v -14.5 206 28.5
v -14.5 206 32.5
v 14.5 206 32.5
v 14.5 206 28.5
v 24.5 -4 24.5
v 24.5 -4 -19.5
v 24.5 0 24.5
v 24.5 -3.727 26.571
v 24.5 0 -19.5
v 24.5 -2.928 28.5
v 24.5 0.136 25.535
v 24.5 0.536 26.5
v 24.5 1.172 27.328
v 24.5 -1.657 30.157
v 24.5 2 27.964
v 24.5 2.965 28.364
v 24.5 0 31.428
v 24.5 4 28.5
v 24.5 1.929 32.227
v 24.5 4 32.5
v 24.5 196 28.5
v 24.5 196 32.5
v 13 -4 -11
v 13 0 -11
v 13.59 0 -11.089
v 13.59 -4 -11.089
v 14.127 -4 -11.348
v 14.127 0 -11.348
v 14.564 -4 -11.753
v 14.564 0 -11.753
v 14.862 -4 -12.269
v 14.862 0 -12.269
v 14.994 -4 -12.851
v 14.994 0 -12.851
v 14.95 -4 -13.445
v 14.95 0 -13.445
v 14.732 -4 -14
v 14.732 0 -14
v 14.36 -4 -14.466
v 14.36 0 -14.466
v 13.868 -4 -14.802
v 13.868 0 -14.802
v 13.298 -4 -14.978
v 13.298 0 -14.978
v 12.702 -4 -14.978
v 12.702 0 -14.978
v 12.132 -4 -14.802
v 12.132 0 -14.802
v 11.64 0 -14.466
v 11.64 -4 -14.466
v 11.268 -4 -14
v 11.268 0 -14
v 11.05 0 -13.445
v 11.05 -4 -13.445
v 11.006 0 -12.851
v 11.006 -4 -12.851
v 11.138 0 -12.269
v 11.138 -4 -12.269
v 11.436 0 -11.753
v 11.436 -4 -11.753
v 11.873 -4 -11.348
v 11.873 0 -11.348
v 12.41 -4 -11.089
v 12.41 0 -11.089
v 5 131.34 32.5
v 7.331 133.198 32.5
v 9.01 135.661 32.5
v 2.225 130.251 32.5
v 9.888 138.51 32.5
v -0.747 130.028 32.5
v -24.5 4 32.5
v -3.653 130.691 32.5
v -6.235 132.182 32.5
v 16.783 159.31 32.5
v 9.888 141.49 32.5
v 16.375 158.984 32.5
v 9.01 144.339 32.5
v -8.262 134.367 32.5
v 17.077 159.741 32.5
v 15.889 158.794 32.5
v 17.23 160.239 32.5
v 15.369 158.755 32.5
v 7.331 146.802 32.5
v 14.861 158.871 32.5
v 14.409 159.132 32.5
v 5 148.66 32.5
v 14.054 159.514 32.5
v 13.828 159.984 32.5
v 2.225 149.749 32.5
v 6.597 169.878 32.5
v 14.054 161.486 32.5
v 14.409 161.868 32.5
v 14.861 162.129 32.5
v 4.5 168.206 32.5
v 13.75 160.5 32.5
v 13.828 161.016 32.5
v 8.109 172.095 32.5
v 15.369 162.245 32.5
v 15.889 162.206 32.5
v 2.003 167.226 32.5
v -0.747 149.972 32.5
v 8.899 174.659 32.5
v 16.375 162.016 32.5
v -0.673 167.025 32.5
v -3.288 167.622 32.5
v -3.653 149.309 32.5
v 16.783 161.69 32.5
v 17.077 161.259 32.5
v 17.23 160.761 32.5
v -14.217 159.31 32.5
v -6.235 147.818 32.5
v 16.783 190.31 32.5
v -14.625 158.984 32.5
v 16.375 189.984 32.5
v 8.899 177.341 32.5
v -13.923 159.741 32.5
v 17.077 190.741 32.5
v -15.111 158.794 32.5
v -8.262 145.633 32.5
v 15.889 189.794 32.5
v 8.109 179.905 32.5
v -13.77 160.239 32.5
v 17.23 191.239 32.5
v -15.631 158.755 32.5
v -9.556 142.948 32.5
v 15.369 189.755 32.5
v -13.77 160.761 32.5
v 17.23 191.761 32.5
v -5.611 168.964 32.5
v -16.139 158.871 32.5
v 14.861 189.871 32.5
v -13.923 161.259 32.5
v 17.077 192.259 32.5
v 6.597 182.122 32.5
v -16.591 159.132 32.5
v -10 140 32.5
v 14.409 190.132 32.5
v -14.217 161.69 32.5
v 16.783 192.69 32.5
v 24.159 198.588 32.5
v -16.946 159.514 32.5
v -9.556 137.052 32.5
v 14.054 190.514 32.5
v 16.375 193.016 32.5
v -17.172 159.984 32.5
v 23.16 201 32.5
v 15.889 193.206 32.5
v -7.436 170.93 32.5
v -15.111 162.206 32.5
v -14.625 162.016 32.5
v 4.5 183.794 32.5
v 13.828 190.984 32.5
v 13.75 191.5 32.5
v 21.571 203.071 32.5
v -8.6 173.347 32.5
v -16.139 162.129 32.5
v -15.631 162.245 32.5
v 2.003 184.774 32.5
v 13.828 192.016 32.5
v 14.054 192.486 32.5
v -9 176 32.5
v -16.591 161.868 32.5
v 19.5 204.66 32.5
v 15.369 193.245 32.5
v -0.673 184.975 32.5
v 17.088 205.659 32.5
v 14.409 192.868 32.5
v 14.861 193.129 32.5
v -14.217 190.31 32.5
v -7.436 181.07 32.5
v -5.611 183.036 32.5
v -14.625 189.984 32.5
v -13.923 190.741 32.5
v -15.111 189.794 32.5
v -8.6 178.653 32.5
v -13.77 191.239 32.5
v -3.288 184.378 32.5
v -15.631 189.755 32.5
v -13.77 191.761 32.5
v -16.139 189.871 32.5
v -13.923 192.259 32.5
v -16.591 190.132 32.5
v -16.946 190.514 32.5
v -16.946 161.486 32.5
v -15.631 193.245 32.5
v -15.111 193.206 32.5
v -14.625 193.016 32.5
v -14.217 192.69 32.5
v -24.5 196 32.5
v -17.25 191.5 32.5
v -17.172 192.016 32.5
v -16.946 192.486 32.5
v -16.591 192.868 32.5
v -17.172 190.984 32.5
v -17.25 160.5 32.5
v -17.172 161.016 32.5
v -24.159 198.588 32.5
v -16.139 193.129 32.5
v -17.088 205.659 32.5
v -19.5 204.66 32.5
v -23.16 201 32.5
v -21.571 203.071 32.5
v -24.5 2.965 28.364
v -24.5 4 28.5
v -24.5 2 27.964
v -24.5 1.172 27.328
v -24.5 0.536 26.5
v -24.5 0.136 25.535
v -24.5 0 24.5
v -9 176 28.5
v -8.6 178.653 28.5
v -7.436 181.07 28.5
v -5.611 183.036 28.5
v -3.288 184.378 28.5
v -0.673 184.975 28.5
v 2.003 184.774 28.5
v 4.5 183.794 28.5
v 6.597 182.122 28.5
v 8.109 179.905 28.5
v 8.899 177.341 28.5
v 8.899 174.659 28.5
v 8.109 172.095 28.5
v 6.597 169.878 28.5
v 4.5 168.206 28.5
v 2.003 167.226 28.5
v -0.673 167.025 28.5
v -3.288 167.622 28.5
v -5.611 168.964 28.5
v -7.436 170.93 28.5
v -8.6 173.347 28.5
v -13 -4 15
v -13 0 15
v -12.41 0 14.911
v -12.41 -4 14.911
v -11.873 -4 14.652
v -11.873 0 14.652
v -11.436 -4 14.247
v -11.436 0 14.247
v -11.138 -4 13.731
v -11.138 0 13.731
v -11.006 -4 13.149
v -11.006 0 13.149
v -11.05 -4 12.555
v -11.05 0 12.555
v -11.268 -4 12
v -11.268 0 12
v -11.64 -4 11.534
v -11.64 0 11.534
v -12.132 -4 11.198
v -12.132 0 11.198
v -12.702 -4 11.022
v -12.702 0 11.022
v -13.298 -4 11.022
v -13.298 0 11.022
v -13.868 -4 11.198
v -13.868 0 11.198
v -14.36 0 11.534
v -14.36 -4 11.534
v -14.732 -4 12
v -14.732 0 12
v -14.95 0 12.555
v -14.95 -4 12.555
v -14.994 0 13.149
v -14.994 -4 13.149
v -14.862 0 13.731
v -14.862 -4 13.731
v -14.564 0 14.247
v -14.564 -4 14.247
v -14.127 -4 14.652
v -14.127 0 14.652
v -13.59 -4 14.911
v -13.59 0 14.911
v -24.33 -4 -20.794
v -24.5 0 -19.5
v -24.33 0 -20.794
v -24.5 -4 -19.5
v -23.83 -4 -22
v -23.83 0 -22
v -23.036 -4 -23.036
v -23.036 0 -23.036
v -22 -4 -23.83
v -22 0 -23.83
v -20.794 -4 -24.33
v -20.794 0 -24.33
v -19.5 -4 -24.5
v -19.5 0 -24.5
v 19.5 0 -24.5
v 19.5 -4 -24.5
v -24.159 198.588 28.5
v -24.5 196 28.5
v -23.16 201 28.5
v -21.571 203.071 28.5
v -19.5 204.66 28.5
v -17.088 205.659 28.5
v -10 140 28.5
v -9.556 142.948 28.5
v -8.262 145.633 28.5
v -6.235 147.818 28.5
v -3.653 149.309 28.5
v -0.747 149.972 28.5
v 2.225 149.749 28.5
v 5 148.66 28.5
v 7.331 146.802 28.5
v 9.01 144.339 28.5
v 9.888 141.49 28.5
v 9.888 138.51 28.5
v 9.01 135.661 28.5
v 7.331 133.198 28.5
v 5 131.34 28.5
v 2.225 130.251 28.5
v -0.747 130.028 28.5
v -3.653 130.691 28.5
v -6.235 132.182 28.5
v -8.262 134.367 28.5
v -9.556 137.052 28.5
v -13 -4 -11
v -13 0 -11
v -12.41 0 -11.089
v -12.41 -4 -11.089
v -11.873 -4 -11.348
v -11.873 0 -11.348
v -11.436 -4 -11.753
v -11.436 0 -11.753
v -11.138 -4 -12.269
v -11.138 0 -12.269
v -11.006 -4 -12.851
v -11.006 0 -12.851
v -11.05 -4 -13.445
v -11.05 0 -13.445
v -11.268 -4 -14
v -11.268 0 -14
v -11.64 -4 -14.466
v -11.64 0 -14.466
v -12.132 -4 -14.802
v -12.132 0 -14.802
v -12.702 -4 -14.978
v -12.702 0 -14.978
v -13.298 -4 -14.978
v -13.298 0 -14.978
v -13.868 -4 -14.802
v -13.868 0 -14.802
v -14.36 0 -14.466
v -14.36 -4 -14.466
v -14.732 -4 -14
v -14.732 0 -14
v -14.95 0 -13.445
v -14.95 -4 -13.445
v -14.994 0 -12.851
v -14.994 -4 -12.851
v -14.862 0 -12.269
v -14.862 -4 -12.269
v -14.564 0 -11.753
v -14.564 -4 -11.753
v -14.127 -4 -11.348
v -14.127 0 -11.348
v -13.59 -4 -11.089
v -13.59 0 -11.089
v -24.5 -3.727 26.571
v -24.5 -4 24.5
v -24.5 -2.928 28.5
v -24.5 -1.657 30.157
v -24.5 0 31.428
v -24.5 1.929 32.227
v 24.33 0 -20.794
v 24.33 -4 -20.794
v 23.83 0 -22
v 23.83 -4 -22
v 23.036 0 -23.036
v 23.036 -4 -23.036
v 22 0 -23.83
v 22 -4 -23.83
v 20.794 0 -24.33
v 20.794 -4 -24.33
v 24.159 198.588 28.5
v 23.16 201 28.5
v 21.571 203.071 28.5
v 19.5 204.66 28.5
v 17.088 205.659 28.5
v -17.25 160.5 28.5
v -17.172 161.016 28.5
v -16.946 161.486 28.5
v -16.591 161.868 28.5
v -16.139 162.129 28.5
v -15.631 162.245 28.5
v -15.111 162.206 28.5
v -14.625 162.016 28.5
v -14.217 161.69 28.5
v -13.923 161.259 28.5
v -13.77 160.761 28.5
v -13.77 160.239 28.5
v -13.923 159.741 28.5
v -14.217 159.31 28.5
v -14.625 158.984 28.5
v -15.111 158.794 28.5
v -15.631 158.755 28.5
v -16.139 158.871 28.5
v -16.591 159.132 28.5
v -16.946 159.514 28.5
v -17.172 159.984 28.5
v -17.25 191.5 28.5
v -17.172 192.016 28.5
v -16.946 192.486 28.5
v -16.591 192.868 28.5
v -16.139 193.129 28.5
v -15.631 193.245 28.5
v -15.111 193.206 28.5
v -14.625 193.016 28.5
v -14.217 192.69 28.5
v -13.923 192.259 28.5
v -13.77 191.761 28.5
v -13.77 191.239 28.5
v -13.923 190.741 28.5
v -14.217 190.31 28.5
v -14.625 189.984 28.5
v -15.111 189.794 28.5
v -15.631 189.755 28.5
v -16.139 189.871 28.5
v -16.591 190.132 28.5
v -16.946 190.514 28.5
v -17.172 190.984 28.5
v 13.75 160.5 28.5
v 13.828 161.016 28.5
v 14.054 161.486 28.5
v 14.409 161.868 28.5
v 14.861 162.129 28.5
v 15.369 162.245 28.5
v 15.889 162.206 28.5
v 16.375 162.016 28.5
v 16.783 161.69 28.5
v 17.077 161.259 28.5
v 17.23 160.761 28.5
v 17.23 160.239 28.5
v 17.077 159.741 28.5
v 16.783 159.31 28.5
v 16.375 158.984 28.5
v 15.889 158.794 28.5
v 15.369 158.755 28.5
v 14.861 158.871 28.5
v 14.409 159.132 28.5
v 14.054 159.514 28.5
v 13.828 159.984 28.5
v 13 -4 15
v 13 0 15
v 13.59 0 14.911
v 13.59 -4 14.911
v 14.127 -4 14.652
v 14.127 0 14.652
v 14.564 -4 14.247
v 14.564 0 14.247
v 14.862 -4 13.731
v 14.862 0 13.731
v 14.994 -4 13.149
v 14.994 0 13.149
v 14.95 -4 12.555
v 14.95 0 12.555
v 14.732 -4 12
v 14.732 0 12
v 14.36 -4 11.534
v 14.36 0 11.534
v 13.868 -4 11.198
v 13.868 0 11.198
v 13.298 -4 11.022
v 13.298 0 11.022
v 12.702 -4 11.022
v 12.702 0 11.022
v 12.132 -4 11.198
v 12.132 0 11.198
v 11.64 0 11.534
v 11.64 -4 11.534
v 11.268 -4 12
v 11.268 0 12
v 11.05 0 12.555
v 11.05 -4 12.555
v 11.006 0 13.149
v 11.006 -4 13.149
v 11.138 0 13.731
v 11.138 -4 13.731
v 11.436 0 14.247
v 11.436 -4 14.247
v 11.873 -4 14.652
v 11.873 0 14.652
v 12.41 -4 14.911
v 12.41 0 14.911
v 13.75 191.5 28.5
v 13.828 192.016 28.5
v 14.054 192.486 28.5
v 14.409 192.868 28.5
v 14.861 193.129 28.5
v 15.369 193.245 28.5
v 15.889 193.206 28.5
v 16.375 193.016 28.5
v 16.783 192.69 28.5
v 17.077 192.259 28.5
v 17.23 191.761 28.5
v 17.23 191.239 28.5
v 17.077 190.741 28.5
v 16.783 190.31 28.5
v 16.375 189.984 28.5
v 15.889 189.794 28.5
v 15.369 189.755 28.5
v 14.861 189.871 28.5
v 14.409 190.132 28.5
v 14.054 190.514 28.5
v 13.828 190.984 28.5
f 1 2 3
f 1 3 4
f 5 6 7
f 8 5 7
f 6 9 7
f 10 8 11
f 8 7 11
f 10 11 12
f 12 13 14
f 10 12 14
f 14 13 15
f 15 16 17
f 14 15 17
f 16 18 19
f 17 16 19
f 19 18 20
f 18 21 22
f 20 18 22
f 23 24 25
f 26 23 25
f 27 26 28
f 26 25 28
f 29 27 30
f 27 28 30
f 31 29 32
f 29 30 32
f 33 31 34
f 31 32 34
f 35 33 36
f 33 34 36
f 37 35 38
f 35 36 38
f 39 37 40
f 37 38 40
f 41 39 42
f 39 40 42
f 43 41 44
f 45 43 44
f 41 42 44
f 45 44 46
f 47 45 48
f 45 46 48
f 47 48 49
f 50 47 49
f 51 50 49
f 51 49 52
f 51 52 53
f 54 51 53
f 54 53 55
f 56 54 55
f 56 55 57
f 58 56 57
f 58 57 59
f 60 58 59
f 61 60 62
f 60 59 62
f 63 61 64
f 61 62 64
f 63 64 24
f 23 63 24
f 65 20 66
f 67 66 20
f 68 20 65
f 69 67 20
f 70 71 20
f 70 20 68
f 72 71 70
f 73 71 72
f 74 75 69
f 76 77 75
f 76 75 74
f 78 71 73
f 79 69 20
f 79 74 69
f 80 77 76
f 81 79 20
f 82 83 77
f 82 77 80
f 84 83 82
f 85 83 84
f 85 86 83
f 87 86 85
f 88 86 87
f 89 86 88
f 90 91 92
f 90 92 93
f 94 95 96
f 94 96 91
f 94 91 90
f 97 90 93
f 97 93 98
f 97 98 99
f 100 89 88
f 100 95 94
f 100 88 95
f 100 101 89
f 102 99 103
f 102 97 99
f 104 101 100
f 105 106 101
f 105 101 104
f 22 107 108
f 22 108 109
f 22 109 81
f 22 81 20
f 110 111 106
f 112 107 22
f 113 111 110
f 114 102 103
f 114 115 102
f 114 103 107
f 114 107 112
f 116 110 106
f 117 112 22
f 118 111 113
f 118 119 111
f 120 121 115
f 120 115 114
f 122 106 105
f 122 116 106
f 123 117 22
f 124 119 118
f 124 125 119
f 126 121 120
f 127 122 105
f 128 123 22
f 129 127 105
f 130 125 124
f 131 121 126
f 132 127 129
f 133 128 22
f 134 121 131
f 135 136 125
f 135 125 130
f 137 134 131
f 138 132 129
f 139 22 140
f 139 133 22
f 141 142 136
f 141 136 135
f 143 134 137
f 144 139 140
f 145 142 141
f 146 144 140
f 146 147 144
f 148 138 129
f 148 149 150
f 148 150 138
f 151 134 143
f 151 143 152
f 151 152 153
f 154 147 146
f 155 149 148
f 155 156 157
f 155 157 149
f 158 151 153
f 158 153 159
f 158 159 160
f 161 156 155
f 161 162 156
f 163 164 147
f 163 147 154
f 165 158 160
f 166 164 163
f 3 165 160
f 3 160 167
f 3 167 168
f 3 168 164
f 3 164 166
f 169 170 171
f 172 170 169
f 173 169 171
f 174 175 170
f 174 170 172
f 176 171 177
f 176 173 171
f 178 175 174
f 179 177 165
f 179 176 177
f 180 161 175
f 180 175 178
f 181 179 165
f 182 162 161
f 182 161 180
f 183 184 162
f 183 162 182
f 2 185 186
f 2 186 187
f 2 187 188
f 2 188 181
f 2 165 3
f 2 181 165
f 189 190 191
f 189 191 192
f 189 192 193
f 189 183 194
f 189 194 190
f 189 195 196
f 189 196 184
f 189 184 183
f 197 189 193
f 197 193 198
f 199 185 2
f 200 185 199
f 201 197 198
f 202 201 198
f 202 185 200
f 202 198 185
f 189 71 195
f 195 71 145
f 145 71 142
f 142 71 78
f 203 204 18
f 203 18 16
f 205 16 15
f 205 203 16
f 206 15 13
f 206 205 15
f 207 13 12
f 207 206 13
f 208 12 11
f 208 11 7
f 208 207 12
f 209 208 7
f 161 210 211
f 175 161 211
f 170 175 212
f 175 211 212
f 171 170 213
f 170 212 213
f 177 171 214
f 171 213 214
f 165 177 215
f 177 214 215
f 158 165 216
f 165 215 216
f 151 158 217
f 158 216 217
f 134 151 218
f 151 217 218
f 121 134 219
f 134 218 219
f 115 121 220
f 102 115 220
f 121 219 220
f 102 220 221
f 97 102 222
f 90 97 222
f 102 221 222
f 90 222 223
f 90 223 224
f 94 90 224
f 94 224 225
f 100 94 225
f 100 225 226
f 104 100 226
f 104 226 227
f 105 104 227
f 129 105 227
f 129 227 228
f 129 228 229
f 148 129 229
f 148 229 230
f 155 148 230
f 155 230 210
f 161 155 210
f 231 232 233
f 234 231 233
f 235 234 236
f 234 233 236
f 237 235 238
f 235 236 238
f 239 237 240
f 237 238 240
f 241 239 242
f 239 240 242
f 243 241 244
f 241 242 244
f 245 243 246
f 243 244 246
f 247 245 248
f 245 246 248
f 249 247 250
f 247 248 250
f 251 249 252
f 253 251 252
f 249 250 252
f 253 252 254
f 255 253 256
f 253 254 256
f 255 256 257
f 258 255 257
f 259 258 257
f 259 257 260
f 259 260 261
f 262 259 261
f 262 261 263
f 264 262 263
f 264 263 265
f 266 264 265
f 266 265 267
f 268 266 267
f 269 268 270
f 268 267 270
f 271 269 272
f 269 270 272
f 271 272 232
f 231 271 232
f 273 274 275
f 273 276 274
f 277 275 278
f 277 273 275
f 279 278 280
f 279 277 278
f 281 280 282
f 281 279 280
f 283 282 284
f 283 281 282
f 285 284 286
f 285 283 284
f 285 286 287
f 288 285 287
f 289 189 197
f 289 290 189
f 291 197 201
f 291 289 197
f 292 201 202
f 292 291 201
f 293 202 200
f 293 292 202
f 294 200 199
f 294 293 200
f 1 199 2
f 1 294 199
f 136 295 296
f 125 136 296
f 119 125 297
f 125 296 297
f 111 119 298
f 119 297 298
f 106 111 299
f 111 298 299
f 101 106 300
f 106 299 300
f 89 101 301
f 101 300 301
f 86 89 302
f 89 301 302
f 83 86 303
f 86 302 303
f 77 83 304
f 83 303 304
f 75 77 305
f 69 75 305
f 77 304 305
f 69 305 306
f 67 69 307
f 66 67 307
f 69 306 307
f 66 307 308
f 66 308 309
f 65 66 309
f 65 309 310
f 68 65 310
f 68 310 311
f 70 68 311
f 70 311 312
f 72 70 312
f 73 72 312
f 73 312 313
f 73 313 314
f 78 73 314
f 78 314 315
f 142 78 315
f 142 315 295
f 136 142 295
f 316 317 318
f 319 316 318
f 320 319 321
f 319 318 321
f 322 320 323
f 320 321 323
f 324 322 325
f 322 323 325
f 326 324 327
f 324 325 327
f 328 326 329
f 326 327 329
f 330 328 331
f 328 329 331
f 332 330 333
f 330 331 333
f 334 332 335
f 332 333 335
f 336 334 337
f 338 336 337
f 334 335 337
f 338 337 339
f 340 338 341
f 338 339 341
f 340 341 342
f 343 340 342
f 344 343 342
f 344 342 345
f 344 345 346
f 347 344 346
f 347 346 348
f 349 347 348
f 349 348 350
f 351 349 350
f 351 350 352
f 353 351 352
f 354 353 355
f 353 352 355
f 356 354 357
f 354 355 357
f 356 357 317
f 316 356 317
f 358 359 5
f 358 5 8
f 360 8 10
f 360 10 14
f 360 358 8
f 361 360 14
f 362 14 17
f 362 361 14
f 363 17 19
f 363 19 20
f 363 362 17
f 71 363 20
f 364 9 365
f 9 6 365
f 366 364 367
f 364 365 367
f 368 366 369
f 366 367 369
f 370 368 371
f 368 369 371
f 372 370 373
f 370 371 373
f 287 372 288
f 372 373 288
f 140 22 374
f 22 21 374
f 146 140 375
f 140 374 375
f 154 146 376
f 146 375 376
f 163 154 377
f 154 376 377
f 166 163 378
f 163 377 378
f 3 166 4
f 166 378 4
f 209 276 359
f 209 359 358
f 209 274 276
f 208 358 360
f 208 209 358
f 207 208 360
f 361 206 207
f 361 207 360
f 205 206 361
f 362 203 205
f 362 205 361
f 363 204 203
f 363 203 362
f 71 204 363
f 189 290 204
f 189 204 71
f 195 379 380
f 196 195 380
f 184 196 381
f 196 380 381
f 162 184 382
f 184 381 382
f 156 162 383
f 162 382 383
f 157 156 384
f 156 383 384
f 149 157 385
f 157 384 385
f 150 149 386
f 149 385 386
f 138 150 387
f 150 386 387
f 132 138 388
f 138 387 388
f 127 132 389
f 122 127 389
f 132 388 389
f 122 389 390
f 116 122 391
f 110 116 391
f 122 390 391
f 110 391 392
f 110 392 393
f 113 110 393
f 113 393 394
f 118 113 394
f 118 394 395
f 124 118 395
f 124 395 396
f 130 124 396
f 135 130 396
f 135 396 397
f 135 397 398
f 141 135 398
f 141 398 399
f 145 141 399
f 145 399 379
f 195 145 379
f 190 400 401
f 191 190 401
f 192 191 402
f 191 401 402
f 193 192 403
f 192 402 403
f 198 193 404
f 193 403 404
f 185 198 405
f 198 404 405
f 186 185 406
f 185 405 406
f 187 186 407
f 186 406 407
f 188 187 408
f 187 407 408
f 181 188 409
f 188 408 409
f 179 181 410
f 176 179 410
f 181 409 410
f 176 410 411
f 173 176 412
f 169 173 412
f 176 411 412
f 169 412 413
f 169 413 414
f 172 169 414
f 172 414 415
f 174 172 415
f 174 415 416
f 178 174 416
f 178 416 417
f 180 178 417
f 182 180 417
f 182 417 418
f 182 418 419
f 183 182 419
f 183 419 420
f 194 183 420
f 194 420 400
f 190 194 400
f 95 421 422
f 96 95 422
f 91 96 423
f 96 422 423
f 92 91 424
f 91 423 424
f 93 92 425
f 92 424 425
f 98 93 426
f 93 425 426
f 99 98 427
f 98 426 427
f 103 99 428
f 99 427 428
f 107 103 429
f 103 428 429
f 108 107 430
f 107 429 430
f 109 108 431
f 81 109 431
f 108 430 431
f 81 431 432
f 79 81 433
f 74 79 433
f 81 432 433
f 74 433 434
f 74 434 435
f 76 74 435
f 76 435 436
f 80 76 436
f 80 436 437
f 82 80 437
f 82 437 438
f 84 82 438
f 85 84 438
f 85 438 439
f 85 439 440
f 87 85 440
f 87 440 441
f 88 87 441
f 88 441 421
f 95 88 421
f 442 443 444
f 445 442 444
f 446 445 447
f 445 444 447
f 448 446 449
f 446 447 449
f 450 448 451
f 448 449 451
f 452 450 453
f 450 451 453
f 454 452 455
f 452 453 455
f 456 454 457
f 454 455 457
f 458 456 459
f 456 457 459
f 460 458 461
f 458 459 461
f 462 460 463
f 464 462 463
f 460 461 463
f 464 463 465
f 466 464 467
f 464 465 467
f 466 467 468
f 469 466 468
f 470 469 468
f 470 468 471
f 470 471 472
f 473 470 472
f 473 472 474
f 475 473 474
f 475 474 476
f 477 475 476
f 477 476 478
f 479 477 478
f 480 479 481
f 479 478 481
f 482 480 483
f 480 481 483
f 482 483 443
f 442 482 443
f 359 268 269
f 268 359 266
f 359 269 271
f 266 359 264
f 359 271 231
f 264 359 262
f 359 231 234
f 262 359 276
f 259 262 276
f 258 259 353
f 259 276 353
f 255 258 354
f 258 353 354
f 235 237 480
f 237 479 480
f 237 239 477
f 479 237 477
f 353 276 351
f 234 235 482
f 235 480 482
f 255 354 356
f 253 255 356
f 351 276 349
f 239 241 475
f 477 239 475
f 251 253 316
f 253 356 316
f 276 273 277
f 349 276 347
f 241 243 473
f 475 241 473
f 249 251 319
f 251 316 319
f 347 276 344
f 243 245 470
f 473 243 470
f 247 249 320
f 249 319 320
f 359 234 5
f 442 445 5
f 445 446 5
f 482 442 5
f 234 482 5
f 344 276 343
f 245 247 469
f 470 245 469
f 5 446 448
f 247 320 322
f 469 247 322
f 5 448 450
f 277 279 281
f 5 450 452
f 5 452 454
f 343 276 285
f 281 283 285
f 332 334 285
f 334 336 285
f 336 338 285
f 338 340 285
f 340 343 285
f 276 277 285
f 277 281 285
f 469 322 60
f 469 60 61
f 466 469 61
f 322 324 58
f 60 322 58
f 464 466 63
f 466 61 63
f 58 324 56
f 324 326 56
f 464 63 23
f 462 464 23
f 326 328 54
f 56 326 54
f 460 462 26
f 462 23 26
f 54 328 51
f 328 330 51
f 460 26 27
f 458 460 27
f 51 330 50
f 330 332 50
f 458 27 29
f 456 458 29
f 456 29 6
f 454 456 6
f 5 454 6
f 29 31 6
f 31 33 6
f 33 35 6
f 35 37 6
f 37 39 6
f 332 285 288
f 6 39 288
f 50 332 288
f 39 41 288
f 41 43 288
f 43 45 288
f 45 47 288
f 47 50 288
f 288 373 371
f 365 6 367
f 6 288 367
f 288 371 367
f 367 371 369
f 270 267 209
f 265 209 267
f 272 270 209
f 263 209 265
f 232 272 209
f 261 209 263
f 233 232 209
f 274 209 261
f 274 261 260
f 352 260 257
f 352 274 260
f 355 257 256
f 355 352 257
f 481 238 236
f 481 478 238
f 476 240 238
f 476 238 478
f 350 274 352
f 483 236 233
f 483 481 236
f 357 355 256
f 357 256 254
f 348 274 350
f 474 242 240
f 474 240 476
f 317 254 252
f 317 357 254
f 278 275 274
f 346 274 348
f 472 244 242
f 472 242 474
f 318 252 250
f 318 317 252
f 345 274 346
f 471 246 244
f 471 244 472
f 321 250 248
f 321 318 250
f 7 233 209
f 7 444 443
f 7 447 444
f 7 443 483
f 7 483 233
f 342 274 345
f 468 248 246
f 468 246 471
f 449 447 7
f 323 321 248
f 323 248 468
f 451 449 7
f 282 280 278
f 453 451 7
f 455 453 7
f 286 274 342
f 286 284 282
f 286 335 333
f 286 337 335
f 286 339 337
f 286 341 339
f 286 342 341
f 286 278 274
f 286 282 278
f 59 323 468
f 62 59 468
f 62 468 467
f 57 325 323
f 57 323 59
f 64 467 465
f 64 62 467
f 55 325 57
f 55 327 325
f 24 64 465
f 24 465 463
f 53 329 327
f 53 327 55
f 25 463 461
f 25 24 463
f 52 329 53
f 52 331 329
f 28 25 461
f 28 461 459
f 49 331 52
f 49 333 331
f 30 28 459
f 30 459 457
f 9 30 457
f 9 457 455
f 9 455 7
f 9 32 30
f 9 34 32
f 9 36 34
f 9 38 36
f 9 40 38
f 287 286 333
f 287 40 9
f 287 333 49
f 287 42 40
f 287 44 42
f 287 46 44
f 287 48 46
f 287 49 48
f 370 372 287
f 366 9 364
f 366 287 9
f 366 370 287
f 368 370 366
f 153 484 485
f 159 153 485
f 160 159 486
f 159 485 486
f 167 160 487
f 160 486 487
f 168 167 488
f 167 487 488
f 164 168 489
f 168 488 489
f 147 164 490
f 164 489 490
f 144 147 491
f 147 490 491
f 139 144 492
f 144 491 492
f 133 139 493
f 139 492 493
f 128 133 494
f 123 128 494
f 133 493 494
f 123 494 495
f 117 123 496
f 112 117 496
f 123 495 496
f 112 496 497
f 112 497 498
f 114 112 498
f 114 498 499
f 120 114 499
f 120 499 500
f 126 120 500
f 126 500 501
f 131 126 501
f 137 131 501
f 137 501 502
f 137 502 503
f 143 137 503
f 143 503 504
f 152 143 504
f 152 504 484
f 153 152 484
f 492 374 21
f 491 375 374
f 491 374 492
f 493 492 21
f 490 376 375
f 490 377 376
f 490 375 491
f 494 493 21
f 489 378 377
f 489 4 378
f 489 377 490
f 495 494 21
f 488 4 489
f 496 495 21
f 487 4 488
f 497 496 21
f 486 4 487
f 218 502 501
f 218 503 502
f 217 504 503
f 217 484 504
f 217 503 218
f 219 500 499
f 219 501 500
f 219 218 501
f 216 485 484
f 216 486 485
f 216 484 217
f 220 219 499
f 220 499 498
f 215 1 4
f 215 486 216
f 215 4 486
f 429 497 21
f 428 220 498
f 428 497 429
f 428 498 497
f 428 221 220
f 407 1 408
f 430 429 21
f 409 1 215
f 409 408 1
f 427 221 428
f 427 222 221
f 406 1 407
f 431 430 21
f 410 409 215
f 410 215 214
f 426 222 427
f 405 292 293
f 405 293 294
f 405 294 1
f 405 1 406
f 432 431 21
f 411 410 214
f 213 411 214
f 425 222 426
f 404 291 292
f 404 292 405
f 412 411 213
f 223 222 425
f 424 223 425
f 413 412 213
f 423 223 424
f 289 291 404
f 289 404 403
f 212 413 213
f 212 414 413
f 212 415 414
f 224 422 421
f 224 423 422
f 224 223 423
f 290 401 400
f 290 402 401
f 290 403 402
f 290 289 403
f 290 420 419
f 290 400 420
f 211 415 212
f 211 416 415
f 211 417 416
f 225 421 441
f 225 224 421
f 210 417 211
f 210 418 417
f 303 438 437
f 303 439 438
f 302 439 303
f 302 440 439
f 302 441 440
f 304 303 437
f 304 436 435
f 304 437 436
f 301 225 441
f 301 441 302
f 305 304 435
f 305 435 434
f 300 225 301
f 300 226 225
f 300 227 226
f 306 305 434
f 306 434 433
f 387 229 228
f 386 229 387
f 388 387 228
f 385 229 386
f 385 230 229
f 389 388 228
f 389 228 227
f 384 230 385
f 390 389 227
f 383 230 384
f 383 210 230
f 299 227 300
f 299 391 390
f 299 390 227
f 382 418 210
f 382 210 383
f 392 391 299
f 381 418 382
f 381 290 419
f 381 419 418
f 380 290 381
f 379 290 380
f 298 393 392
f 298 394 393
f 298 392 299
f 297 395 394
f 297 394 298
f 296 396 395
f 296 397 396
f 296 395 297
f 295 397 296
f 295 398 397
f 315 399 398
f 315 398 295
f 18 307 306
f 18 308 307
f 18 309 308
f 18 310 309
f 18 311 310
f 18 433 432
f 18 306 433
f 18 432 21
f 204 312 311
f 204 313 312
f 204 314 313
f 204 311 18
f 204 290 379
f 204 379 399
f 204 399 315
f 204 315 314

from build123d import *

# Parameters (mm, degrees)
SKETCH1_W          = 49
SKETCH1_H          = 49
SKETCH1_R          = 2
BASE_FLANGE1_DEPTH = 4
EDGE_FLANGE1_DEPTH = 49
SKETCH9_R          = 10
CUT_EXTRUDE1_DEPTH = 10
SKETCH10_R         = 9
SKETCH10_R_2       = 10
SKETCH10_R_3       = 1.75
CUT_EXTRUDE2_DEPTH = 215.115039173
FILLET1_R          = 10
FILLET2_R          = 5


# Sheet-metal steps are written as plain solids
with BuildPart() as part:
    # Sketch1 → Base-Flange1 (new body)
    with BuildSketch(Plane(origin=(0, 0, 0), x_dir=(1, 0, 0), z_dir=(0, 1, 0))):
        Rectangle(SKETCH1_W, SKETCH1_H)
        with Locations(Location((-13, -13, 0), (0, 0, 270))):
            Circle(SKETCH1_R, mode=Mode.SUBTRACT)
        with Locations(Location((-13, 13, 0), (0, 0, 270))):
            Circle(SKETCH1_R, mode=Mode.SUBTRACT)
        with Locations(Location((13, 13, 0), (0, 0, 270))):
            Circle(SKETCH1_R, mode=Mode.SUBTRACT)
        with Locations(Location((13, -13, 0), (0, 0, 270))):
            Circle(SKETCH1_R, mode=Mode.SUBTRACT)
    extrude(amount=-BASE_FLANGE1_DEPTH)

    # Edge-Flange1 section (across the edge) → Edge-Flange1 (add)
    with BuildSketch(Plane(origin=(-24.5, 0, 28.5), x_dir=(0, 0, -1), z_dir=(1, 0, 0))):
        with BuildLine():
            Line((-4, 4), (-4, 206))
            Line((-4, 206), (0, 206))
            Line((0, 206), (0, 4))
            ThreePointArc((0, 4), (1.171572875, 1.171572875), (4, 0))
            Line((4, 0), (4, -4))
            ThreePointArc((4, -4), (-1.656854249, -1.656854249), (-4, 4))
        make_face()
    extrude(amount=EDGE_FLANGE1_DEPTH)

    # Sketch9 → Cut-Extrude1 (cut)
    with BuildSketch(Plane(origin=(0, 0, 28.5), x_dir=(-1, 0, 0), z_dir=(0, 0, -1))):
        with Locations((0, 140)):
            Circle(SKETCH9_R)
    extrude(amount=-CUT_EXTRUDE1_DEPTH, mode=Mode.SUBTRACT)

    # Sketch10 → Cut-Extrude2 (cut, through all)
    with BuildSketch(Plane(origin=(0, 0, 28.5), x_dir=(-1, 0, 0), z_dir=(0, 0, -1))):
        with Locations((0, 176)):
            Circle(SKETCH10_R)
        with Locations((0, 140)):
            Circle(SKETCH10_R_2)
        with Locations((-15.5, 160.5)):
            Circle(SKETCH10_R_3)
        with Locations((-15.5, 191.5)):
            Circle(SKETCH10_R_3)
        with Locations((15.5, 191.5)):
            Circle(SKETCH10_R_3)
        with Locations((15.5, 160.5)):
            Circle(SKETCH10_R_3)
    extrude(amount=-CUT_EXTRUDE2_DEPTH, mode=Mode.SUBTRACT)

    # Fillet1
    fillet1_edges = [part.edges().sort_by_distance(p)[0] for p in [
        (-24.5, 206, 30.5),
        (24.5, 206, 30.5),
    ]]
    fillet(fillet1_edges, radius=FILLET1_R)

    # Fillet2
    fillet2_edges = [part.edges().sort_by_distance(p)[0] for p in [
        (-24.5, -2, -24.5),
        (24.5, -2, -24.5),
    ]]
    fillet(fillet2_edges, radius=FILLET2_R)


solid = part.part
